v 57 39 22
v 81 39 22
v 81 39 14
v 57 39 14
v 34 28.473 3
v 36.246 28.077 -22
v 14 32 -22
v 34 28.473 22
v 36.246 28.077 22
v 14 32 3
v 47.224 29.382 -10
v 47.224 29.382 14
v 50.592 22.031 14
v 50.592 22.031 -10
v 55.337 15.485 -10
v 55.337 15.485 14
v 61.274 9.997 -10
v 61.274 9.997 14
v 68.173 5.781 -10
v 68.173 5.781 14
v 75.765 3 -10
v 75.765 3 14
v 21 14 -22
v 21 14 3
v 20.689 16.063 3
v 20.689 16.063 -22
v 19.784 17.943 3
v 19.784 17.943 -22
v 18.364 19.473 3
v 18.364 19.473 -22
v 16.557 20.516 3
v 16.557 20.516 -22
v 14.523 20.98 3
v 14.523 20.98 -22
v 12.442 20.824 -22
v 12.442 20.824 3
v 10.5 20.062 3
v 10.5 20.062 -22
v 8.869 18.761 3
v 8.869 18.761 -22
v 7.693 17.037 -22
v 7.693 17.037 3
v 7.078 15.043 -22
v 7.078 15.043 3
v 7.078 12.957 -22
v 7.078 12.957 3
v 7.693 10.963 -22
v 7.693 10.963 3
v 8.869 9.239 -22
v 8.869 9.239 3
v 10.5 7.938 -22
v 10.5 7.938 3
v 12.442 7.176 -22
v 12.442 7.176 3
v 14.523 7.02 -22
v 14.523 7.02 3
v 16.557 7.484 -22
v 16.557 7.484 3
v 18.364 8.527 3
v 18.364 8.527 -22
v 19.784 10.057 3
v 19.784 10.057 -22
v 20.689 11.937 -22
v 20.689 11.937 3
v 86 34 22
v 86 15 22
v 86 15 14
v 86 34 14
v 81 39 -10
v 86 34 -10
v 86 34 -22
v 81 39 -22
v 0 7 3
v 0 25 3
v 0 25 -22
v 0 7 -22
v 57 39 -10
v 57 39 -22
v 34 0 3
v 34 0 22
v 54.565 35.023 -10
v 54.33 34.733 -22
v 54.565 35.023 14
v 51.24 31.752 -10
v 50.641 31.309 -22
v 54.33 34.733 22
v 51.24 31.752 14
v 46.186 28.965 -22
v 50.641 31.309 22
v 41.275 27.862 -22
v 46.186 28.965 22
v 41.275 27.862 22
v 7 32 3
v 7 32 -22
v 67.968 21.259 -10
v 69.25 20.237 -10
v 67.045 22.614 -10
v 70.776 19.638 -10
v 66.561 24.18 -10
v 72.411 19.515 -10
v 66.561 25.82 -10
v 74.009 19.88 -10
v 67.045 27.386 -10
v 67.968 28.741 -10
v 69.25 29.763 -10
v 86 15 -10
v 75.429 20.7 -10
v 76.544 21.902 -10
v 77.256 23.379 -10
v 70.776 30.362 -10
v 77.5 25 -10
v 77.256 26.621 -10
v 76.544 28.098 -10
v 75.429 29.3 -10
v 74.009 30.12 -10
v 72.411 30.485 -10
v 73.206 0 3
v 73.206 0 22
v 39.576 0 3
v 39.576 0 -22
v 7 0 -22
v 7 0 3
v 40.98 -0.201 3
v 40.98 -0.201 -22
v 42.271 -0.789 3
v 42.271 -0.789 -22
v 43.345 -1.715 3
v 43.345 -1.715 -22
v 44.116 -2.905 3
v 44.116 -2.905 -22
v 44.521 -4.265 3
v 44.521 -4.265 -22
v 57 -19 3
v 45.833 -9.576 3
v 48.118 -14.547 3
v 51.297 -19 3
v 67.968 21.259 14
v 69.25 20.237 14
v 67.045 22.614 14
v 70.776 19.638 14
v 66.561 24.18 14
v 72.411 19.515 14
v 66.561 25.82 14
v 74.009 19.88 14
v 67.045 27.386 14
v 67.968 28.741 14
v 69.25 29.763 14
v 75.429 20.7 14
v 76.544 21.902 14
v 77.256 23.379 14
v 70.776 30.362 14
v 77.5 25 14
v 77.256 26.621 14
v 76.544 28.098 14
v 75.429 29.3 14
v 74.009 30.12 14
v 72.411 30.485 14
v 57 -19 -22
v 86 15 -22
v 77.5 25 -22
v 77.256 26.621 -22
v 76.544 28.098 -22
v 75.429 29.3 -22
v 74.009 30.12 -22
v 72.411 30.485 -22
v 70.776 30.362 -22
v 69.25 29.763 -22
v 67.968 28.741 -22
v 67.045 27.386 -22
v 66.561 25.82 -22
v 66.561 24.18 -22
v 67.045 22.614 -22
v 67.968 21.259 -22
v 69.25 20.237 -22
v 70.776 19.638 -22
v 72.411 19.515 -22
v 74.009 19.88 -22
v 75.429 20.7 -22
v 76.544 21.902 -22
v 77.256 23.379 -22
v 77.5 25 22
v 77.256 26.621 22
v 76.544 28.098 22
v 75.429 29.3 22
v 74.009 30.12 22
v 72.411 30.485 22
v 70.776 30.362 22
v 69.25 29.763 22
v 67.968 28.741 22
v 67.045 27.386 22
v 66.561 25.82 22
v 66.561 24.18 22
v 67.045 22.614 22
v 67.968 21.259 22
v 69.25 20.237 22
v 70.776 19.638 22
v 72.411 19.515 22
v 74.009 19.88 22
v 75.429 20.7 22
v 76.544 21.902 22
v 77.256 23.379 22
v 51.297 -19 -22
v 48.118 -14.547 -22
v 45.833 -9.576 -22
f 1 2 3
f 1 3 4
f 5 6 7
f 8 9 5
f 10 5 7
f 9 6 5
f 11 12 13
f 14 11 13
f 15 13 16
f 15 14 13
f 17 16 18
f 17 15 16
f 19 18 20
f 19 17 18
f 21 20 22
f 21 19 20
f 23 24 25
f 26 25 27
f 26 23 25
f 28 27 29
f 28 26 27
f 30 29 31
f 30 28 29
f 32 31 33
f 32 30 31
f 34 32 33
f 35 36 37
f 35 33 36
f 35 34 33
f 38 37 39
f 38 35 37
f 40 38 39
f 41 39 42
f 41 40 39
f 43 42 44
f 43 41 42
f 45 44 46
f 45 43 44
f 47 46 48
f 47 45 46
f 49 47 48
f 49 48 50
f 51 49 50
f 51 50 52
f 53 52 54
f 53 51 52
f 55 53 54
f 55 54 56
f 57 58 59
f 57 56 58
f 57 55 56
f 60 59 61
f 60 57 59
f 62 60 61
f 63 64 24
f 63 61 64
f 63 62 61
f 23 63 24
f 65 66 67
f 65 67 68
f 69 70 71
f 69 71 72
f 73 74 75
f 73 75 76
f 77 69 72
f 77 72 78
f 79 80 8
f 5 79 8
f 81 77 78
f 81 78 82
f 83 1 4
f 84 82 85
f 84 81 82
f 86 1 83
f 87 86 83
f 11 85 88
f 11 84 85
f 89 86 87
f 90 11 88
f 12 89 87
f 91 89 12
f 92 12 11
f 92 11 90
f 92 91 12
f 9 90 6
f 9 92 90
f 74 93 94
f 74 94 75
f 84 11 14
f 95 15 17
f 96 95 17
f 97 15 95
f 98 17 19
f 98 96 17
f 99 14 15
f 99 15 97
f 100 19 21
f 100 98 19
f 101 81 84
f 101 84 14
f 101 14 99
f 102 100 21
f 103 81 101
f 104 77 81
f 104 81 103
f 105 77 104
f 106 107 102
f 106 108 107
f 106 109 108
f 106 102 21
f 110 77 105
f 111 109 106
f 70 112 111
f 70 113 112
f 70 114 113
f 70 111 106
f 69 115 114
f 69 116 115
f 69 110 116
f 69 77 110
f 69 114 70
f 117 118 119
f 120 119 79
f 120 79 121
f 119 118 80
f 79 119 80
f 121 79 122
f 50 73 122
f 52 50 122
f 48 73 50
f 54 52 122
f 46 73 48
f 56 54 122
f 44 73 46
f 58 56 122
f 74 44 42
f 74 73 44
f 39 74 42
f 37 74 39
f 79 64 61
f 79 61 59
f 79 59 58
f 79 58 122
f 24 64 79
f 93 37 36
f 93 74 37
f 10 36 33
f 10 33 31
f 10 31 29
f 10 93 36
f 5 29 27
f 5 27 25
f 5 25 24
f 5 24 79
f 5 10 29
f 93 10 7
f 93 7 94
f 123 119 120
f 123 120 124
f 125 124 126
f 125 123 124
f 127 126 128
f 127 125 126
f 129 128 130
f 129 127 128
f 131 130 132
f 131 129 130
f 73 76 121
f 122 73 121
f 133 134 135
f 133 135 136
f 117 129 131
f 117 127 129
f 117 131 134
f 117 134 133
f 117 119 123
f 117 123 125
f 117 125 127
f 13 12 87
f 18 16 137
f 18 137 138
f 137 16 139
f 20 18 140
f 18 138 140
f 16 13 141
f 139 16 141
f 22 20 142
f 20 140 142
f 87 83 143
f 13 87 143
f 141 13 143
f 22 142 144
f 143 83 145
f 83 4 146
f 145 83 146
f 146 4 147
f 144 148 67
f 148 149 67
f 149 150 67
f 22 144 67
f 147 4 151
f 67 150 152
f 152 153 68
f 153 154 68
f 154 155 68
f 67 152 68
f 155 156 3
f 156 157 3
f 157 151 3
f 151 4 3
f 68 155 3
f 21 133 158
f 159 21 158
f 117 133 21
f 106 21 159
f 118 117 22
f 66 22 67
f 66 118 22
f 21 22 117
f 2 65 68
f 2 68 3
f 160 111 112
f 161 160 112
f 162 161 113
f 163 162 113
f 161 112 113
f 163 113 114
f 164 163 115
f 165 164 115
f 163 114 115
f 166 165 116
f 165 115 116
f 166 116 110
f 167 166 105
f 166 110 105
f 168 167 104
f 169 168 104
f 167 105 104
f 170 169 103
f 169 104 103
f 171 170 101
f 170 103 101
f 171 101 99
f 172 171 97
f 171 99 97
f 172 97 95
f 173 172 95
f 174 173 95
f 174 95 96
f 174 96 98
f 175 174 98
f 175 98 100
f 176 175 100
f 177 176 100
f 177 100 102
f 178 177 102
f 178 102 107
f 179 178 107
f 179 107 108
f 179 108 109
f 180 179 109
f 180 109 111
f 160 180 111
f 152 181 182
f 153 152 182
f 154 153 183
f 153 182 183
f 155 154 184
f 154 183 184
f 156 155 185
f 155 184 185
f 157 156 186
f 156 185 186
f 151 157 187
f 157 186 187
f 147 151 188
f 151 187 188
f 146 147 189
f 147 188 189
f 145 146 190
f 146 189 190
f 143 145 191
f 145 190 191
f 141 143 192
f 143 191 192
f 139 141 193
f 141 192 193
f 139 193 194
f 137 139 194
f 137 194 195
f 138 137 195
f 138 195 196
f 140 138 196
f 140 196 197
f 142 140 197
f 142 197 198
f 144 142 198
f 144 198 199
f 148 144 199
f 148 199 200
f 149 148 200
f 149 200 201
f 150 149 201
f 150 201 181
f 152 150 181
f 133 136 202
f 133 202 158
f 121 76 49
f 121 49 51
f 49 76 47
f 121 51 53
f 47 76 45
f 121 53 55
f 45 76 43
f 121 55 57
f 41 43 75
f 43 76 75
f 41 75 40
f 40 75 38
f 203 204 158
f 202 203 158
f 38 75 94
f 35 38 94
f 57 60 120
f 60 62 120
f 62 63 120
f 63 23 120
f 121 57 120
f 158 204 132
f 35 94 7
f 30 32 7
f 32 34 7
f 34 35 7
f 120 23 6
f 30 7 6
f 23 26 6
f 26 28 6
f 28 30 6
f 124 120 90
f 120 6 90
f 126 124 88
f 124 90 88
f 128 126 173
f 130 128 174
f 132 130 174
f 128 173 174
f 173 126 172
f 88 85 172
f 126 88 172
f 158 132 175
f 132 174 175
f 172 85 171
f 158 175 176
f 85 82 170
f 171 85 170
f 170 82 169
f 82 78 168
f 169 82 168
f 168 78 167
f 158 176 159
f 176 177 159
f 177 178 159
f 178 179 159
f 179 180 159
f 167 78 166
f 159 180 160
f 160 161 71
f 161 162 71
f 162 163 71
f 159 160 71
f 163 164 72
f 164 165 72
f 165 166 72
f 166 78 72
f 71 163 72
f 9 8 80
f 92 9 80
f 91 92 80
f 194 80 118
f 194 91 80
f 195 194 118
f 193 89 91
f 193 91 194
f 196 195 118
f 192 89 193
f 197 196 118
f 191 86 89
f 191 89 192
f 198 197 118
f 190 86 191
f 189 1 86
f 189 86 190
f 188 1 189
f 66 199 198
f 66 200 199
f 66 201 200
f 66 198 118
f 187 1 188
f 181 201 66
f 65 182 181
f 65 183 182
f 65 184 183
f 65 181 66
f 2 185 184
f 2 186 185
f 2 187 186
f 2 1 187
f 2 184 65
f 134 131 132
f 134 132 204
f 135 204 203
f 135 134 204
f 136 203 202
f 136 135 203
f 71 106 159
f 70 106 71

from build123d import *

# Parameters (mm, degrees)
ESQUISSE2_R             = 7
BOSS_EXTRU_2_DEPTH      = 22
ENL_V_MAT_EXTRU_1_DEPTH = 19
ESQUISSE5_R             = 5.5
ENL_V_MAT_EXTRU_2_DEPTH = 45
ENL_V_START             = -12
ENL_V_MAT_EXTRU_3_DEPTH = 24


with BuildPart() as part:
    # Esquisse2 → Boss.-Extru.2 (new body, symmetric)
    with BuildSketch(Plane.XY):
        with BuildLine():
            Line((51.296980053, -19), (57, -19))
            Line((57, -19), (86, 15))
            Line((86, 15), (86, 34))
            Line((86, 34), (81, 39))
            Line((81, 39), (57, 39))
            ThreePointArc((57, 39), (48.490791592, 29.99016727), (36.246410316, 28.077357637))
            Line((36.246410316, 28.077357637), (14, 32))
            Line((14, 32), (7, 32))
            Line((7, 32), (0, 25))
            Line((0, 25), (0, 7))
            Line((0, 7), (7, 0))
            Line((7, 0), (39.575538911, 0))
            ThreePointArc((39.575538911, 0), (42.840774692, -1.213413768), (44.521177653, -4.264705882))
            ThreePointArc((44.521177653, -4.264705882), (46.858007856, -12.115672061), (51.296980053, -19))
        make_face()
        with Locations((14, 14)):
            Circle(ESQUISSE2_R, mode=Mode.SUBTRACT)
    extrude(amount=BOSS_EXTRU_2_DEPTH, both=True)

    # Esquisse4 → Enlèv. mat.-Extru.1 (cut)
    with BuildSketch(Plane.XY.offset(22)):
        Polygon((34, 32), (0, 32), (0, -19), (86, -19), (86, 0), (34, 0), align=None)
    extrude(amount=-ENL_V_MAT_EXTRU_1_DEPTH, mode=Mode.SUBTRACT)

    # Esquisse5 → Enlèv. mat.-Extru.2 (cut, through all)
    with BuildSketch(Plane.XY.offset(22)):
        with Locations((72, 25)):
            Circle(ESQUISSE5_R)
    extrude(amount=-ENL_V_MAT_EXTRU_2_DEPTH, mode=Mode.SUBTRACT)

    # Esquisse14 → Enlèv. mat.-Extru.3 (cut)
    with BuildSketch(Plane(origin=(0, 0, -22), x_dir=(-1, 0, 0), z_dir=(0, 0, -1)).offset(ENL_V_START)):
        with BuildLine():
            Line((-75.764705882, 3), (-86, 15))
            Line((-86, 15), (-86, 34))
            Line((-86, 34), (-81, 39))
            Line((-81, 39), (-57, 39))
            ThreePointArc((-57, 39), (-53.002548038, 33.285750119), (-47.224051208, 29.381745985))
            ThreePointArc((-47.224051208, 29.381745985), (-58.169717695, 12.59414375), (-75.764705882, 3))
        make_face()
    extrude(amount=-ENL_V_MAT_EXTRU_3_DEPTH, mode=Mode.SUBTRACT)


solid = part.part
